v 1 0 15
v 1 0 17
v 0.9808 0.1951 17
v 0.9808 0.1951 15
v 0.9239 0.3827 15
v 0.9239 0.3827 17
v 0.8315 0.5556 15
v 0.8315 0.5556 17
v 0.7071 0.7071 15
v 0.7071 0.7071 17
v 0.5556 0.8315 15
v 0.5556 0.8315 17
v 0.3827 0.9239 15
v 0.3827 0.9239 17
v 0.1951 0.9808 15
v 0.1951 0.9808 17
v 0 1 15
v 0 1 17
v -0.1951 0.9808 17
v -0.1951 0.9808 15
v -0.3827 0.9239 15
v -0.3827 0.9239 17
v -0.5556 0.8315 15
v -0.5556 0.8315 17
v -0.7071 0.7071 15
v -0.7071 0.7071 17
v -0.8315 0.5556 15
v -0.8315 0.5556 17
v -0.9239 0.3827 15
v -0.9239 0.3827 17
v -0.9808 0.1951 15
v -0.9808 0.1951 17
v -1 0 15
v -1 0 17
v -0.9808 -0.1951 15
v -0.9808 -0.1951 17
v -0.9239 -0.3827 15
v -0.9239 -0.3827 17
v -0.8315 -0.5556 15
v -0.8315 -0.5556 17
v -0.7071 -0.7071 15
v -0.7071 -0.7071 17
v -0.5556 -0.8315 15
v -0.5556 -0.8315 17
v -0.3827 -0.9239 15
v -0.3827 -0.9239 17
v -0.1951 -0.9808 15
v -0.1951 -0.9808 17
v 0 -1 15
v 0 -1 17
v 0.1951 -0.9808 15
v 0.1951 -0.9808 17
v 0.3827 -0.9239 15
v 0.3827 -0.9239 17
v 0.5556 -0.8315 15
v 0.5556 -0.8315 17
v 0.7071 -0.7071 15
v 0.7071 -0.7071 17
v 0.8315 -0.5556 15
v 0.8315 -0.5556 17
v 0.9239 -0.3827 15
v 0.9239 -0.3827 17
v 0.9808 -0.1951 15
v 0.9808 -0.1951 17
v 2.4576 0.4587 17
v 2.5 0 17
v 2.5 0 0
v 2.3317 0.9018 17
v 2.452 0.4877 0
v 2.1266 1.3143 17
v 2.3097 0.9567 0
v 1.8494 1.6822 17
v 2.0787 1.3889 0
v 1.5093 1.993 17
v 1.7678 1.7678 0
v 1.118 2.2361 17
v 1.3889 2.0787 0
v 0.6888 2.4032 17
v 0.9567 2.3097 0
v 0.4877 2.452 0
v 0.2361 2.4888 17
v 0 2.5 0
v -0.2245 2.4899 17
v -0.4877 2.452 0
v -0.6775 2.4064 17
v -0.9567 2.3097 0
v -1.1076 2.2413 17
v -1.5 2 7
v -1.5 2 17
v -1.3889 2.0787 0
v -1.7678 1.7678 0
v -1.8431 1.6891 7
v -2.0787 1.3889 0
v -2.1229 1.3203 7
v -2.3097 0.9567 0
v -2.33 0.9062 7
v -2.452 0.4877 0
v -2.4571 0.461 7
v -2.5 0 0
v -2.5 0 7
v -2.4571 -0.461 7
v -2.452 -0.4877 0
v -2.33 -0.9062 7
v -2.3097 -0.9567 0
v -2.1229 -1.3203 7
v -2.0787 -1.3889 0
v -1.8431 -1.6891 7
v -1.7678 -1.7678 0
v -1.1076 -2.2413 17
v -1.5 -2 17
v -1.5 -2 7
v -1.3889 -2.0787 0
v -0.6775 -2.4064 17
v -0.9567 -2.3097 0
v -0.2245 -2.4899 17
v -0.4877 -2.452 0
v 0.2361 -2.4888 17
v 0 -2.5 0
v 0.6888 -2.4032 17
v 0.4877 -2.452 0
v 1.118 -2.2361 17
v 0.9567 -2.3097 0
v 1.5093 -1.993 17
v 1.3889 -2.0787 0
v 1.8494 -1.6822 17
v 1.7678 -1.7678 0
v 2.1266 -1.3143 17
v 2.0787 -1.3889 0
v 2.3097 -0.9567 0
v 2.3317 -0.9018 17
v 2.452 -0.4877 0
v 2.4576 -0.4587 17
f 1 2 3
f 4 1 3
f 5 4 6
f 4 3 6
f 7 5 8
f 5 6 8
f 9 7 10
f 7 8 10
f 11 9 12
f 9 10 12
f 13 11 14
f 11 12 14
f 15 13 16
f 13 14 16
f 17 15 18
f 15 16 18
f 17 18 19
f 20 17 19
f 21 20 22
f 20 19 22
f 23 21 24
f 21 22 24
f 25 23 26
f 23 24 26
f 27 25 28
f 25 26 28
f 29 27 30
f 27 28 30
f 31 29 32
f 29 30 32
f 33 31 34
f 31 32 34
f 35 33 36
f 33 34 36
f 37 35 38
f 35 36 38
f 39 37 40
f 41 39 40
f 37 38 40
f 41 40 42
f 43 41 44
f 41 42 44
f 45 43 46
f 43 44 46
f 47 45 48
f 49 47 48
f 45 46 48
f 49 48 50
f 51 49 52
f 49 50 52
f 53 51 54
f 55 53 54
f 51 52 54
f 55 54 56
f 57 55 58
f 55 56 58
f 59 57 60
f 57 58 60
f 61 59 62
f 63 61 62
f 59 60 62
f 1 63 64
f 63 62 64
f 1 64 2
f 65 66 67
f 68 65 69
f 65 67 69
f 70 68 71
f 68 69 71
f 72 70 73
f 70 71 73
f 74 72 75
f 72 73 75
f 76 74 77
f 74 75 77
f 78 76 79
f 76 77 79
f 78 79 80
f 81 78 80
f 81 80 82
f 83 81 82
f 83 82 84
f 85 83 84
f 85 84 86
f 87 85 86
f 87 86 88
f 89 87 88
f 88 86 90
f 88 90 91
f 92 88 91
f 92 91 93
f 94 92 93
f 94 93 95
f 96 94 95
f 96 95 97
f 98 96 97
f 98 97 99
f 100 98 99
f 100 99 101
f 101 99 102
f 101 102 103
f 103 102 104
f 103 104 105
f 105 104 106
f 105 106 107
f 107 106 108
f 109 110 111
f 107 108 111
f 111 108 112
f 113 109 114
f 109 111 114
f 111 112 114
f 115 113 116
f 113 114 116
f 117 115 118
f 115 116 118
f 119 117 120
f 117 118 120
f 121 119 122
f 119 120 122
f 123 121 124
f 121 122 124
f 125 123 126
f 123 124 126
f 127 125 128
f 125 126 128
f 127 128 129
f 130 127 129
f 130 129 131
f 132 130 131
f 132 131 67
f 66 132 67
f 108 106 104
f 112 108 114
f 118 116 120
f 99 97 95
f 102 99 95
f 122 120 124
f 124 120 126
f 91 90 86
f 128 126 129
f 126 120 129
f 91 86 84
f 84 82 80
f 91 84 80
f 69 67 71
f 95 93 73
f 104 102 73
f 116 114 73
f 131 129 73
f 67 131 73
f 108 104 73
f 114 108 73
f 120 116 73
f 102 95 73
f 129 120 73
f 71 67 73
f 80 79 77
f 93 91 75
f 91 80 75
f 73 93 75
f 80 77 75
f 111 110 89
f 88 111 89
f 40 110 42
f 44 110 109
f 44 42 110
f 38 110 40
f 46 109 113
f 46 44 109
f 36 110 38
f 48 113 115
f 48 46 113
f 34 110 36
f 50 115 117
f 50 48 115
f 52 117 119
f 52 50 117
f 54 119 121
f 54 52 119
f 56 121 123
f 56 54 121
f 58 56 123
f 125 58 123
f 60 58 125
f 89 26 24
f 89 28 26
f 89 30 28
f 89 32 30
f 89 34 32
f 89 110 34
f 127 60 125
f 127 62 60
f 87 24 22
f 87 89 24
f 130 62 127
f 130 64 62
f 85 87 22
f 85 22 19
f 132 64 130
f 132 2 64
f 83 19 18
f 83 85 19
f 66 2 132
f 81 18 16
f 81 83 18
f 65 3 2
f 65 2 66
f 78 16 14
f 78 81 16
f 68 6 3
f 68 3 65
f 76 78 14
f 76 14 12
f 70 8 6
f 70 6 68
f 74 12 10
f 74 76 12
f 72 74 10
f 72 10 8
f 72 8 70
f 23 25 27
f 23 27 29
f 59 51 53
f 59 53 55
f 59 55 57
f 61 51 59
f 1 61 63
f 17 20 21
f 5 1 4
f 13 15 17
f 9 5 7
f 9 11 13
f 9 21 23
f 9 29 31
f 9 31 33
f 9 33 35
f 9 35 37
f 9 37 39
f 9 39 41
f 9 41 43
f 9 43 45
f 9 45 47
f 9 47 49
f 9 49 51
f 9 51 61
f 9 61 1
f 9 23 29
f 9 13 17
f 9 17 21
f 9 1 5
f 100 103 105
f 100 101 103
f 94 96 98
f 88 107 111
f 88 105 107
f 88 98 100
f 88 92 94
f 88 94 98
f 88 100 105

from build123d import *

# Parameters (mm, degrees)
SKETCH1_R           = 2.5
BOSS_EXTRUDE1_DEPTH = 17
SKETCH2_W           = 1
SKETCH2_H           = 5
CUT_EXTRUDE1_DEPTH  = 10
SKETCH3_R           = 1
CUT_EXTRUDE2_DEPTH  = 2


with BuildPart() as part:
    # Sketch1 → Boss-Extrude1 (new body)
    with BuildSketch(Plane.XY):
        Circle(SKETCH1_R)
    extrude(amount=BOSS_EXTRUDE1_DEPTH)

    # Sketch2 → Cut-Extrude1 (cut)
    with BuildSketch(Plane.XY.offset(17)):
        with Locations((-2, 0)):
            Rectangle(SKETCH2_W, SKETCH2_H)
    extrude(amount=-CUT_EXTRUDE1_DEPTH, mode=Mode.SUBTRACT)

    # Sketch3 → Cut-Extrude2 (cut)
    with BuildSketch(Plane.XY.offset(17)):
        Circle(SKETCH3_R)
    extrude(amount=-CUT_EXTRUDE2_DEPTH, mode=Mode.SUBTRACT)


solid = part.part
